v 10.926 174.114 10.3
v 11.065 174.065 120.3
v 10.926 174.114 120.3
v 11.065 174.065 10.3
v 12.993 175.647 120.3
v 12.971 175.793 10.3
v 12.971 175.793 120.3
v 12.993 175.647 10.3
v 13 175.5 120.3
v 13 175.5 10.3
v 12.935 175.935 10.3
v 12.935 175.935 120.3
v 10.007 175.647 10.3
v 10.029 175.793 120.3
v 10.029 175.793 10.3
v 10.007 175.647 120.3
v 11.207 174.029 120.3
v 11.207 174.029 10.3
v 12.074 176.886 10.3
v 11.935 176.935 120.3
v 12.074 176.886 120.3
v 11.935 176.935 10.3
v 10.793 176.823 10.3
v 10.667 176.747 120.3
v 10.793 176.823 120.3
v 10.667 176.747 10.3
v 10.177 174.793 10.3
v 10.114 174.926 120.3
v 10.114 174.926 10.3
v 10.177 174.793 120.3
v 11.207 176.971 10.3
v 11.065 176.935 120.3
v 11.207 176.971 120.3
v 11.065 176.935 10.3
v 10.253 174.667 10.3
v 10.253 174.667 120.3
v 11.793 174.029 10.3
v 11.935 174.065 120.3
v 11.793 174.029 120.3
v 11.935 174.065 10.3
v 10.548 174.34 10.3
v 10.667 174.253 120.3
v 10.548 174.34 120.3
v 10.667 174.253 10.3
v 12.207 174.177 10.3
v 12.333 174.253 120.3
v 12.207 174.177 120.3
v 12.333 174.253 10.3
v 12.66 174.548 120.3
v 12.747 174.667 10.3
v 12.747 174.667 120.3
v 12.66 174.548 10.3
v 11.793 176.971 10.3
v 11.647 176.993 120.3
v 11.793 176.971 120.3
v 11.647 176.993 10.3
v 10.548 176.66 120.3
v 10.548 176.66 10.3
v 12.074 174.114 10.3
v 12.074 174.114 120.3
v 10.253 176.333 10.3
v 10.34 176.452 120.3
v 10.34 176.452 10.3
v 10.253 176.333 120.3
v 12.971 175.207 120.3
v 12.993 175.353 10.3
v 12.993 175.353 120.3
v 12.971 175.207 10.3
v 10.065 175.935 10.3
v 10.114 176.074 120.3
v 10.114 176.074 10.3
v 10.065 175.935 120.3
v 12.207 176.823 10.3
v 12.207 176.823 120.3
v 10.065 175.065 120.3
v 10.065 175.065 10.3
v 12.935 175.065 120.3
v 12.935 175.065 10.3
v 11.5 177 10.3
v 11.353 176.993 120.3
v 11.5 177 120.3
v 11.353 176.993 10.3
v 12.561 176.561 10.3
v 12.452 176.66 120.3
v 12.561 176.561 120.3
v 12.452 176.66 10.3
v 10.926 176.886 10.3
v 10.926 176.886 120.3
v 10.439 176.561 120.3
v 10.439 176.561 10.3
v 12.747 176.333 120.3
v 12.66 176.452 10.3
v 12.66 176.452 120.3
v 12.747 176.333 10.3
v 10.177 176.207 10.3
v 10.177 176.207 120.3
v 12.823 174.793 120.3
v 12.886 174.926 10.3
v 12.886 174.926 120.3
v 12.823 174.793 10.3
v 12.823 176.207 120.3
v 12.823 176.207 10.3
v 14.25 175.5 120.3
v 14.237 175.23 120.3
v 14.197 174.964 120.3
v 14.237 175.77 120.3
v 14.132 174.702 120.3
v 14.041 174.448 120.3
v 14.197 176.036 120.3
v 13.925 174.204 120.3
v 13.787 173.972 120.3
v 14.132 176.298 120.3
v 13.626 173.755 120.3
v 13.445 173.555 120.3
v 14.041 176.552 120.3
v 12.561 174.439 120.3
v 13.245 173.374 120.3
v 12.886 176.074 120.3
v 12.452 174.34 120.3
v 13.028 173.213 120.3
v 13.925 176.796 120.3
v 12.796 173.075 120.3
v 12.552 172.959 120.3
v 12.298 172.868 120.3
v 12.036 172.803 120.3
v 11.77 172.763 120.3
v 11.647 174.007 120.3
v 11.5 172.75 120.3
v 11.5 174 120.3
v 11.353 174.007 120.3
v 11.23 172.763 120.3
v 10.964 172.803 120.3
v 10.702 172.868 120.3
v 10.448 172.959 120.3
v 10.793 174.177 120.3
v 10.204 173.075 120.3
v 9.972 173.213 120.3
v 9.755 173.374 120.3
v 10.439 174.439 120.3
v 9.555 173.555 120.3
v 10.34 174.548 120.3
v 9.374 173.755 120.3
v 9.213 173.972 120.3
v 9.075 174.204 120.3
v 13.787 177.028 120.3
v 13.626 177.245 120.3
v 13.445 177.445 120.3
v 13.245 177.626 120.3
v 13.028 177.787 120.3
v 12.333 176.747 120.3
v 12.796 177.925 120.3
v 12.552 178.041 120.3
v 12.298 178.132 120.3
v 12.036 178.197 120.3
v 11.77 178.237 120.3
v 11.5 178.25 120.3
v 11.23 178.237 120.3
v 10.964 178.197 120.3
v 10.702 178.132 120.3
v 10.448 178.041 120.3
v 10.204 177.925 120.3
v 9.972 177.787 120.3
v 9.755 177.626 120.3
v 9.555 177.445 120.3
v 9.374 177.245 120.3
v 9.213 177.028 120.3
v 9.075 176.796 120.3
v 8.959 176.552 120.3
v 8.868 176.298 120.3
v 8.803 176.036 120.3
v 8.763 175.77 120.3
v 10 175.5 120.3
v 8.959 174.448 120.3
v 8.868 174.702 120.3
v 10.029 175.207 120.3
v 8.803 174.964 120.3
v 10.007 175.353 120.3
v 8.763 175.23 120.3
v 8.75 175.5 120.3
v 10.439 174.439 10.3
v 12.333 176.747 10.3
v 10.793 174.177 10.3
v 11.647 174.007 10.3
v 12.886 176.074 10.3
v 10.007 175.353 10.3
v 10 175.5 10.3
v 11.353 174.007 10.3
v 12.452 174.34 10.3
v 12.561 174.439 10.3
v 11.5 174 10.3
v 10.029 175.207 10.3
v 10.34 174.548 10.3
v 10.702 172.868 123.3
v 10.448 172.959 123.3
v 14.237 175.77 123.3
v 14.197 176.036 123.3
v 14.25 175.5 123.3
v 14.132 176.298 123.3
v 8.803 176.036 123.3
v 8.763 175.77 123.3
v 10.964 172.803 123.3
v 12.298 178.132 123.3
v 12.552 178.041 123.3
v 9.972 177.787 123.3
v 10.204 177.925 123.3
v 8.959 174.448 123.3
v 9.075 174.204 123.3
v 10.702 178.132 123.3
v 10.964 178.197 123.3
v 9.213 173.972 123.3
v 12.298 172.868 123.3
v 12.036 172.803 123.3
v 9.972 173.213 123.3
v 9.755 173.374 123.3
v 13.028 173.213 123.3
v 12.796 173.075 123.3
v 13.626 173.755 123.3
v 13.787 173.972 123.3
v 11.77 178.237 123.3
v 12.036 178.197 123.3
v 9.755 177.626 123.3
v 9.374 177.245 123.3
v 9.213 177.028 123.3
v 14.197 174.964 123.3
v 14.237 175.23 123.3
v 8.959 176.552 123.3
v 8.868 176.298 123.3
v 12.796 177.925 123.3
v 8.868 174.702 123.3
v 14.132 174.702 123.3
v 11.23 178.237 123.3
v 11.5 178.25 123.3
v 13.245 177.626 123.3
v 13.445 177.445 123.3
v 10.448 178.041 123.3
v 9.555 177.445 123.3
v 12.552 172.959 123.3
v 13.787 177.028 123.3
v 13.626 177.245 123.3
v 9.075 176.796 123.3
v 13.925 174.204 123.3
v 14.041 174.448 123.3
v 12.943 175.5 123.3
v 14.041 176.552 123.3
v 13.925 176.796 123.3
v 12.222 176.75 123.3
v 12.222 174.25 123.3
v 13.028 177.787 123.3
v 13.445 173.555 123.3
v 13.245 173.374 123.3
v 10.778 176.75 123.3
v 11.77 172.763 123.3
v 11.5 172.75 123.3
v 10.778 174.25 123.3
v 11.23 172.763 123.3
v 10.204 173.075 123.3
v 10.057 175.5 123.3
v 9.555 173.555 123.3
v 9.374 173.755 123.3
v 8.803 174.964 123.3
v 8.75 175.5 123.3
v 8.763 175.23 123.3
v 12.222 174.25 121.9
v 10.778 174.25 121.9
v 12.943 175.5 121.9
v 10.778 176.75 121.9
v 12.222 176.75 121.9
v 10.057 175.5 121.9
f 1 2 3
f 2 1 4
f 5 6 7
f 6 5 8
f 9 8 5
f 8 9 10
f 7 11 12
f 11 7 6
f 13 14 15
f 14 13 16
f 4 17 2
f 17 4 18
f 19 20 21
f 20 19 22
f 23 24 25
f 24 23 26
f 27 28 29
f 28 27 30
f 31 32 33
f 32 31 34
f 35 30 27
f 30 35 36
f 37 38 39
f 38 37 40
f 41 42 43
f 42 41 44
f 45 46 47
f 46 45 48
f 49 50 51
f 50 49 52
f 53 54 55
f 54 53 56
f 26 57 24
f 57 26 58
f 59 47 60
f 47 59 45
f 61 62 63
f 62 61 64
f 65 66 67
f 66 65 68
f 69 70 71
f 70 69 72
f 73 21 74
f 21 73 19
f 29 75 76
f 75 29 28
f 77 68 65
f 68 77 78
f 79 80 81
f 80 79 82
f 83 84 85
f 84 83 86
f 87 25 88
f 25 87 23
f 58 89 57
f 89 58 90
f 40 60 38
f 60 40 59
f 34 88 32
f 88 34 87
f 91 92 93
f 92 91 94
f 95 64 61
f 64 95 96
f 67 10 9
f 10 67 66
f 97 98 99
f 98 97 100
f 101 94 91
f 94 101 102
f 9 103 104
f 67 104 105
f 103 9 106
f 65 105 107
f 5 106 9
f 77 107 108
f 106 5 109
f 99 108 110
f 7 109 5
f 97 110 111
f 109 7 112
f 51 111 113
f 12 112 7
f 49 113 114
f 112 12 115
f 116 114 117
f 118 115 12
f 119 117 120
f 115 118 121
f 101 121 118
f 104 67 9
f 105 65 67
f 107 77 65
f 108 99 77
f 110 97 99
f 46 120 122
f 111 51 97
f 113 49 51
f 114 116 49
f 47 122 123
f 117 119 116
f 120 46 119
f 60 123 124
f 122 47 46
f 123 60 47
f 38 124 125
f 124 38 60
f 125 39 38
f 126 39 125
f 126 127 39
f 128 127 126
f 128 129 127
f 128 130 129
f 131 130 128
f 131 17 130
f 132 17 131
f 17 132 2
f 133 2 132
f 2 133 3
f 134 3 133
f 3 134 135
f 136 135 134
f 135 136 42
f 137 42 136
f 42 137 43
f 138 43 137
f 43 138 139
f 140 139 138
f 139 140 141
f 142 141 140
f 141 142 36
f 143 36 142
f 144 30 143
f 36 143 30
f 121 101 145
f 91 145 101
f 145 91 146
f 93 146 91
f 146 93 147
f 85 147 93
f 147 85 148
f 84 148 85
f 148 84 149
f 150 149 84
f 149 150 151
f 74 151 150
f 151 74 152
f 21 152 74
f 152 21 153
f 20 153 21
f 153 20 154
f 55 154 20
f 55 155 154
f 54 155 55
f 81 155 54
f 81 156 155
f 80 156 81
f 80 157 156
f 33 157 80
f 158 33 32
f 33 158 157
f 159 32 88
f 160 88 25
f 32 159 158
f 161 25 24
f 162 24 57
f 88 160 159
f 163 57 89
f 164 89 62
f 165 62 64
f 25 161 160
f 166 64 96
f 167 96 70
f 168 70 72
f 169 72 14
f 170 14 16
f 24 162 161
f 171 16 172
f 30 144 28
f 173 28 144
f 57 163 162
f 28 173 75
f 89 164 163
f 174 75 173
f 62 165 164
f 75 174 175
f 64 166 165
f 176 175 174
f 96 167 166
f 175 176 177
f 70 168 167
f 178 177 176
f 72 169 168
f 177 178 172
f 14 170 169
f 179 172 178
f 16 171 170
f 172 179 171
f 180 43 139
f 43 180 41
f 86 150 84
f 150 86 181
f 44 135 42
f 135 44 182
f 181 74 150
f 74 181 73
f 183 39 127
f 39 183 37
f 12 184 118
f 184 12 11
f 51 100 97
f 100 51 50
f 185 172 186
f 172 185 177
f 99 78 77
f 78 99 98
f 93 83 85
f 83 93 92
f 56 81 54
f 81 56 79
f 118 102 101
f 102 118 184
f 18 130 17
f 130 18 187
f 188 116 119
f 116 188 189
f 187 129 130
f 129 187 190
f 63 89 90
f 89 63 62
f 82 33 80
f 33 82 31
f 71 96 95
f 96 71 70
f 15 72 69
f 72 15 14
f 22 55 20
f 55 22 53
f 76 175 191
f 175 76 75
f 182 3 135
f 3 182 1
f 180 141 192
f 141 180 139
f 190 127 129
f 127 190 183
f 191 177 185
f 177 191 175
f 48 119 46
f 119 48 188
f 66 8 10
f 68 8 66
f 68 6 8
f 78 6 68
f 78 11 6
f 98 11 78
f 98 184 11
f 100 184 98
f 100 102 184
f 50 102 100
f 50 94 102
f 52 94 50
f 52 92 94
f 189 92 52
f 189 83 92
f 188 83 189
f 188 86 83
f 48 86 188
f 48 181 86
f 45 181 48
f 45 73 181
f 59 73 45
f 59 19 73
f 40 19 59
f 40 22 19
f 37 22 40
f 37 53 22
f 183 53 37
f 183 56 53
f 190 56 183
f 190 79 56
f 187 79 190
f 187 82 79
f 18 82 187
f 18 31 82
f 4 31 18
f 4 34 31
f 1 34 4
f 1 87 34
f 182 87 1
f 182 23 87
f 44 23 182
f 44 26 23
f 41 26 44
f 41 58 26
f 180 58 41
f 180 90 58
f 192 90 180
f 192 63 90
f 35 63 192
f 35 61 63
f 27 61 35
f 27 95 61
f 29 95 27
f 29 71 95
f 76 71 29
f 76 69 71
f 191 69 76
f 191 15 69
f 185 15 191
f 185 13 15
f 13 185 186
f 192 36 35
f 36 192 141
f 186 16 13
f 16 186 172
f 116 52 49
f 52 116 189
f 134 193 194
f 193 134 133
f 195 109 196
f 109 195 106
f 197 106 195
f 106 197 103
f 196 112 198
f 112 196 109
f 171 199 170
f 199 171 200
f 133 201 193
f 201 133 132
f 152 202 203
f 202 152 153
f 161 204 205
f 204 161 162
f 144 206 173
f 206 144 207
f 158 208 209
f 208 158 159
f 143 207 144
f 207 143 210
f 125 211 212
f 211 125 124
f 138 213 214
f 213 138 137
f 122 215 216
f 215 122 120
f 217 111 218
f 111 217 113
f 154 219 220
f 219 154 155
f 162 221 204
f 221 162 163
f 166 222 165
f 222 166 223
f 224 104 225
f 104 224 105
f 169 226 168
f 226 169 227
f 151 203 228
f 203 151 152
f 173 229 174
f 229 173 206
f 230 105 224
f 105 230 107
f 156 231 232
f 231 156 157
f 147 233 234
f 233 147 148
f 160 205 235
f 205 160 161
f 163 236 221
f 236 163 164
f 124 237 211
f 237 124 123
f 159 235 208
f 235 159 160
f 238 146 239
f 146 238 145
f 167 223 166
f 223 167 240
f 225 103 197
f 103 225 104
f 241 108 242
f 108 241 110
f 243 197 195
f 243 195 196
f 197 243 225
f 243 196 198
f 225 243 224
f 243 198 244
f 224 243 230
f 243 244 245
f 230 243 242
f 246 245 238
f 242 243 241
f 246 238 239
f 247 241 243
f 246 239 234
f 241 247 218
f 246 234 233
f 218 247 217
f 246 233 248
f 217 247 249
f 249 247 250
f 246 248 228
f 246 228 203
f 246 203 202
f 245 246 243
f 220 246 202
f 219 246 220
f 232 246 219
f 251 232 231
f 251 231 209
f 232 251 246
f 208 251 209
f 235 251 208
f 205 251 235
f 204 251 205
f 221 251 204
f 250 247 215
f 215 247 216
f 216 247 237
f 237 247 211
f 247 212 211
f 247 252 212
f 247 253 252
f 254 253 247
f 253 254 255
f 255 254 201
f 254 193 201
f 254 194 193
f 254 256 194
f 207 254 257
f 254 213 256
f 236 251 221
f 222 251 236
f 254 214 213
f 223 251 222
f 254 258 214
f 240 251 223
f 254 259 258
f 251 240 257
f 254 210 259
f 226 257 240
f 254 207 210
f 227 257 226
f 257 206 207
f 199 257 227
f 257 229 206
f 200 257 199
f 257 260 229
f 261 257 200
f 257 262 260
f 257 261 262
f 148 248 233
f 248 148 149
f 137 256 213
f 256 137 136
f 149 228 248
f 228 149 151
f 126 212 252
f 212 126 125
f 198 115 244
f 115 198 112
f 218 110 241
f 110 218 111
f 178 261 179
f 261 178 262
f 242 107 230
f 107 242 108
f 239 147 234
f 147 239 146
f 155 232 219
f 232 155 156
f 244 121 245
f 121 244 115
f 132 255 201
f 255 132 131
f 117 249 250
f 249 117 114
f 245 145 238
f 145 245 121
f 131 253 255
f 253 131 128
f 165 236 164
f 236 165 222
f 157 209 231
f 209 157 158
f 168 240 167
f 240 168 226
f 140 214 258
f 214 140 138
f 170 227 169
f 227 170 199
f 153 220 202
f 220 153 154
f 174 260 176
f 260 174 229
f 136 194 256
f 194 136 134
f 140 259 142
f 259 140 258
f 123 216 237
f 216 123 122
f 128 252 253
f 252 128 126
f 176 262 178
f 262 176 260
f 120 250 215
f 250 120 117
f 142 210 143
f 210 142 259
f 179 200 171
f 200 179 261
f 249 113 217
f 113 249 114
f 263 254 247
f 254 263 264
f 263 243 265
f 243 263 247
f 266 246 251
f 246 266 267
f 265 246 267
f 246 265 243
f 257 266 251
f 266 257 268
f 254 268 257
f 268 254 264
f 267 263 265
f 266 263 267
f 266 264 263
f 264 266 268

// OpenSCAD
// Generated from the same CSG operations as STEP. Rebuild with spec/build_parent_hand_service.py.
difference(){union(){translate([11.5,175.5,10.3]) cylinder(r=1.5,h=110,$fn=64);translate([11.5,175.5,120.3]) cylinder(r=2.75,h=3,$fn=64);}translate([11.5,175.5,121.9]) cylinder(r=1.4433756729740643,h=1.5,$fn=6);}
